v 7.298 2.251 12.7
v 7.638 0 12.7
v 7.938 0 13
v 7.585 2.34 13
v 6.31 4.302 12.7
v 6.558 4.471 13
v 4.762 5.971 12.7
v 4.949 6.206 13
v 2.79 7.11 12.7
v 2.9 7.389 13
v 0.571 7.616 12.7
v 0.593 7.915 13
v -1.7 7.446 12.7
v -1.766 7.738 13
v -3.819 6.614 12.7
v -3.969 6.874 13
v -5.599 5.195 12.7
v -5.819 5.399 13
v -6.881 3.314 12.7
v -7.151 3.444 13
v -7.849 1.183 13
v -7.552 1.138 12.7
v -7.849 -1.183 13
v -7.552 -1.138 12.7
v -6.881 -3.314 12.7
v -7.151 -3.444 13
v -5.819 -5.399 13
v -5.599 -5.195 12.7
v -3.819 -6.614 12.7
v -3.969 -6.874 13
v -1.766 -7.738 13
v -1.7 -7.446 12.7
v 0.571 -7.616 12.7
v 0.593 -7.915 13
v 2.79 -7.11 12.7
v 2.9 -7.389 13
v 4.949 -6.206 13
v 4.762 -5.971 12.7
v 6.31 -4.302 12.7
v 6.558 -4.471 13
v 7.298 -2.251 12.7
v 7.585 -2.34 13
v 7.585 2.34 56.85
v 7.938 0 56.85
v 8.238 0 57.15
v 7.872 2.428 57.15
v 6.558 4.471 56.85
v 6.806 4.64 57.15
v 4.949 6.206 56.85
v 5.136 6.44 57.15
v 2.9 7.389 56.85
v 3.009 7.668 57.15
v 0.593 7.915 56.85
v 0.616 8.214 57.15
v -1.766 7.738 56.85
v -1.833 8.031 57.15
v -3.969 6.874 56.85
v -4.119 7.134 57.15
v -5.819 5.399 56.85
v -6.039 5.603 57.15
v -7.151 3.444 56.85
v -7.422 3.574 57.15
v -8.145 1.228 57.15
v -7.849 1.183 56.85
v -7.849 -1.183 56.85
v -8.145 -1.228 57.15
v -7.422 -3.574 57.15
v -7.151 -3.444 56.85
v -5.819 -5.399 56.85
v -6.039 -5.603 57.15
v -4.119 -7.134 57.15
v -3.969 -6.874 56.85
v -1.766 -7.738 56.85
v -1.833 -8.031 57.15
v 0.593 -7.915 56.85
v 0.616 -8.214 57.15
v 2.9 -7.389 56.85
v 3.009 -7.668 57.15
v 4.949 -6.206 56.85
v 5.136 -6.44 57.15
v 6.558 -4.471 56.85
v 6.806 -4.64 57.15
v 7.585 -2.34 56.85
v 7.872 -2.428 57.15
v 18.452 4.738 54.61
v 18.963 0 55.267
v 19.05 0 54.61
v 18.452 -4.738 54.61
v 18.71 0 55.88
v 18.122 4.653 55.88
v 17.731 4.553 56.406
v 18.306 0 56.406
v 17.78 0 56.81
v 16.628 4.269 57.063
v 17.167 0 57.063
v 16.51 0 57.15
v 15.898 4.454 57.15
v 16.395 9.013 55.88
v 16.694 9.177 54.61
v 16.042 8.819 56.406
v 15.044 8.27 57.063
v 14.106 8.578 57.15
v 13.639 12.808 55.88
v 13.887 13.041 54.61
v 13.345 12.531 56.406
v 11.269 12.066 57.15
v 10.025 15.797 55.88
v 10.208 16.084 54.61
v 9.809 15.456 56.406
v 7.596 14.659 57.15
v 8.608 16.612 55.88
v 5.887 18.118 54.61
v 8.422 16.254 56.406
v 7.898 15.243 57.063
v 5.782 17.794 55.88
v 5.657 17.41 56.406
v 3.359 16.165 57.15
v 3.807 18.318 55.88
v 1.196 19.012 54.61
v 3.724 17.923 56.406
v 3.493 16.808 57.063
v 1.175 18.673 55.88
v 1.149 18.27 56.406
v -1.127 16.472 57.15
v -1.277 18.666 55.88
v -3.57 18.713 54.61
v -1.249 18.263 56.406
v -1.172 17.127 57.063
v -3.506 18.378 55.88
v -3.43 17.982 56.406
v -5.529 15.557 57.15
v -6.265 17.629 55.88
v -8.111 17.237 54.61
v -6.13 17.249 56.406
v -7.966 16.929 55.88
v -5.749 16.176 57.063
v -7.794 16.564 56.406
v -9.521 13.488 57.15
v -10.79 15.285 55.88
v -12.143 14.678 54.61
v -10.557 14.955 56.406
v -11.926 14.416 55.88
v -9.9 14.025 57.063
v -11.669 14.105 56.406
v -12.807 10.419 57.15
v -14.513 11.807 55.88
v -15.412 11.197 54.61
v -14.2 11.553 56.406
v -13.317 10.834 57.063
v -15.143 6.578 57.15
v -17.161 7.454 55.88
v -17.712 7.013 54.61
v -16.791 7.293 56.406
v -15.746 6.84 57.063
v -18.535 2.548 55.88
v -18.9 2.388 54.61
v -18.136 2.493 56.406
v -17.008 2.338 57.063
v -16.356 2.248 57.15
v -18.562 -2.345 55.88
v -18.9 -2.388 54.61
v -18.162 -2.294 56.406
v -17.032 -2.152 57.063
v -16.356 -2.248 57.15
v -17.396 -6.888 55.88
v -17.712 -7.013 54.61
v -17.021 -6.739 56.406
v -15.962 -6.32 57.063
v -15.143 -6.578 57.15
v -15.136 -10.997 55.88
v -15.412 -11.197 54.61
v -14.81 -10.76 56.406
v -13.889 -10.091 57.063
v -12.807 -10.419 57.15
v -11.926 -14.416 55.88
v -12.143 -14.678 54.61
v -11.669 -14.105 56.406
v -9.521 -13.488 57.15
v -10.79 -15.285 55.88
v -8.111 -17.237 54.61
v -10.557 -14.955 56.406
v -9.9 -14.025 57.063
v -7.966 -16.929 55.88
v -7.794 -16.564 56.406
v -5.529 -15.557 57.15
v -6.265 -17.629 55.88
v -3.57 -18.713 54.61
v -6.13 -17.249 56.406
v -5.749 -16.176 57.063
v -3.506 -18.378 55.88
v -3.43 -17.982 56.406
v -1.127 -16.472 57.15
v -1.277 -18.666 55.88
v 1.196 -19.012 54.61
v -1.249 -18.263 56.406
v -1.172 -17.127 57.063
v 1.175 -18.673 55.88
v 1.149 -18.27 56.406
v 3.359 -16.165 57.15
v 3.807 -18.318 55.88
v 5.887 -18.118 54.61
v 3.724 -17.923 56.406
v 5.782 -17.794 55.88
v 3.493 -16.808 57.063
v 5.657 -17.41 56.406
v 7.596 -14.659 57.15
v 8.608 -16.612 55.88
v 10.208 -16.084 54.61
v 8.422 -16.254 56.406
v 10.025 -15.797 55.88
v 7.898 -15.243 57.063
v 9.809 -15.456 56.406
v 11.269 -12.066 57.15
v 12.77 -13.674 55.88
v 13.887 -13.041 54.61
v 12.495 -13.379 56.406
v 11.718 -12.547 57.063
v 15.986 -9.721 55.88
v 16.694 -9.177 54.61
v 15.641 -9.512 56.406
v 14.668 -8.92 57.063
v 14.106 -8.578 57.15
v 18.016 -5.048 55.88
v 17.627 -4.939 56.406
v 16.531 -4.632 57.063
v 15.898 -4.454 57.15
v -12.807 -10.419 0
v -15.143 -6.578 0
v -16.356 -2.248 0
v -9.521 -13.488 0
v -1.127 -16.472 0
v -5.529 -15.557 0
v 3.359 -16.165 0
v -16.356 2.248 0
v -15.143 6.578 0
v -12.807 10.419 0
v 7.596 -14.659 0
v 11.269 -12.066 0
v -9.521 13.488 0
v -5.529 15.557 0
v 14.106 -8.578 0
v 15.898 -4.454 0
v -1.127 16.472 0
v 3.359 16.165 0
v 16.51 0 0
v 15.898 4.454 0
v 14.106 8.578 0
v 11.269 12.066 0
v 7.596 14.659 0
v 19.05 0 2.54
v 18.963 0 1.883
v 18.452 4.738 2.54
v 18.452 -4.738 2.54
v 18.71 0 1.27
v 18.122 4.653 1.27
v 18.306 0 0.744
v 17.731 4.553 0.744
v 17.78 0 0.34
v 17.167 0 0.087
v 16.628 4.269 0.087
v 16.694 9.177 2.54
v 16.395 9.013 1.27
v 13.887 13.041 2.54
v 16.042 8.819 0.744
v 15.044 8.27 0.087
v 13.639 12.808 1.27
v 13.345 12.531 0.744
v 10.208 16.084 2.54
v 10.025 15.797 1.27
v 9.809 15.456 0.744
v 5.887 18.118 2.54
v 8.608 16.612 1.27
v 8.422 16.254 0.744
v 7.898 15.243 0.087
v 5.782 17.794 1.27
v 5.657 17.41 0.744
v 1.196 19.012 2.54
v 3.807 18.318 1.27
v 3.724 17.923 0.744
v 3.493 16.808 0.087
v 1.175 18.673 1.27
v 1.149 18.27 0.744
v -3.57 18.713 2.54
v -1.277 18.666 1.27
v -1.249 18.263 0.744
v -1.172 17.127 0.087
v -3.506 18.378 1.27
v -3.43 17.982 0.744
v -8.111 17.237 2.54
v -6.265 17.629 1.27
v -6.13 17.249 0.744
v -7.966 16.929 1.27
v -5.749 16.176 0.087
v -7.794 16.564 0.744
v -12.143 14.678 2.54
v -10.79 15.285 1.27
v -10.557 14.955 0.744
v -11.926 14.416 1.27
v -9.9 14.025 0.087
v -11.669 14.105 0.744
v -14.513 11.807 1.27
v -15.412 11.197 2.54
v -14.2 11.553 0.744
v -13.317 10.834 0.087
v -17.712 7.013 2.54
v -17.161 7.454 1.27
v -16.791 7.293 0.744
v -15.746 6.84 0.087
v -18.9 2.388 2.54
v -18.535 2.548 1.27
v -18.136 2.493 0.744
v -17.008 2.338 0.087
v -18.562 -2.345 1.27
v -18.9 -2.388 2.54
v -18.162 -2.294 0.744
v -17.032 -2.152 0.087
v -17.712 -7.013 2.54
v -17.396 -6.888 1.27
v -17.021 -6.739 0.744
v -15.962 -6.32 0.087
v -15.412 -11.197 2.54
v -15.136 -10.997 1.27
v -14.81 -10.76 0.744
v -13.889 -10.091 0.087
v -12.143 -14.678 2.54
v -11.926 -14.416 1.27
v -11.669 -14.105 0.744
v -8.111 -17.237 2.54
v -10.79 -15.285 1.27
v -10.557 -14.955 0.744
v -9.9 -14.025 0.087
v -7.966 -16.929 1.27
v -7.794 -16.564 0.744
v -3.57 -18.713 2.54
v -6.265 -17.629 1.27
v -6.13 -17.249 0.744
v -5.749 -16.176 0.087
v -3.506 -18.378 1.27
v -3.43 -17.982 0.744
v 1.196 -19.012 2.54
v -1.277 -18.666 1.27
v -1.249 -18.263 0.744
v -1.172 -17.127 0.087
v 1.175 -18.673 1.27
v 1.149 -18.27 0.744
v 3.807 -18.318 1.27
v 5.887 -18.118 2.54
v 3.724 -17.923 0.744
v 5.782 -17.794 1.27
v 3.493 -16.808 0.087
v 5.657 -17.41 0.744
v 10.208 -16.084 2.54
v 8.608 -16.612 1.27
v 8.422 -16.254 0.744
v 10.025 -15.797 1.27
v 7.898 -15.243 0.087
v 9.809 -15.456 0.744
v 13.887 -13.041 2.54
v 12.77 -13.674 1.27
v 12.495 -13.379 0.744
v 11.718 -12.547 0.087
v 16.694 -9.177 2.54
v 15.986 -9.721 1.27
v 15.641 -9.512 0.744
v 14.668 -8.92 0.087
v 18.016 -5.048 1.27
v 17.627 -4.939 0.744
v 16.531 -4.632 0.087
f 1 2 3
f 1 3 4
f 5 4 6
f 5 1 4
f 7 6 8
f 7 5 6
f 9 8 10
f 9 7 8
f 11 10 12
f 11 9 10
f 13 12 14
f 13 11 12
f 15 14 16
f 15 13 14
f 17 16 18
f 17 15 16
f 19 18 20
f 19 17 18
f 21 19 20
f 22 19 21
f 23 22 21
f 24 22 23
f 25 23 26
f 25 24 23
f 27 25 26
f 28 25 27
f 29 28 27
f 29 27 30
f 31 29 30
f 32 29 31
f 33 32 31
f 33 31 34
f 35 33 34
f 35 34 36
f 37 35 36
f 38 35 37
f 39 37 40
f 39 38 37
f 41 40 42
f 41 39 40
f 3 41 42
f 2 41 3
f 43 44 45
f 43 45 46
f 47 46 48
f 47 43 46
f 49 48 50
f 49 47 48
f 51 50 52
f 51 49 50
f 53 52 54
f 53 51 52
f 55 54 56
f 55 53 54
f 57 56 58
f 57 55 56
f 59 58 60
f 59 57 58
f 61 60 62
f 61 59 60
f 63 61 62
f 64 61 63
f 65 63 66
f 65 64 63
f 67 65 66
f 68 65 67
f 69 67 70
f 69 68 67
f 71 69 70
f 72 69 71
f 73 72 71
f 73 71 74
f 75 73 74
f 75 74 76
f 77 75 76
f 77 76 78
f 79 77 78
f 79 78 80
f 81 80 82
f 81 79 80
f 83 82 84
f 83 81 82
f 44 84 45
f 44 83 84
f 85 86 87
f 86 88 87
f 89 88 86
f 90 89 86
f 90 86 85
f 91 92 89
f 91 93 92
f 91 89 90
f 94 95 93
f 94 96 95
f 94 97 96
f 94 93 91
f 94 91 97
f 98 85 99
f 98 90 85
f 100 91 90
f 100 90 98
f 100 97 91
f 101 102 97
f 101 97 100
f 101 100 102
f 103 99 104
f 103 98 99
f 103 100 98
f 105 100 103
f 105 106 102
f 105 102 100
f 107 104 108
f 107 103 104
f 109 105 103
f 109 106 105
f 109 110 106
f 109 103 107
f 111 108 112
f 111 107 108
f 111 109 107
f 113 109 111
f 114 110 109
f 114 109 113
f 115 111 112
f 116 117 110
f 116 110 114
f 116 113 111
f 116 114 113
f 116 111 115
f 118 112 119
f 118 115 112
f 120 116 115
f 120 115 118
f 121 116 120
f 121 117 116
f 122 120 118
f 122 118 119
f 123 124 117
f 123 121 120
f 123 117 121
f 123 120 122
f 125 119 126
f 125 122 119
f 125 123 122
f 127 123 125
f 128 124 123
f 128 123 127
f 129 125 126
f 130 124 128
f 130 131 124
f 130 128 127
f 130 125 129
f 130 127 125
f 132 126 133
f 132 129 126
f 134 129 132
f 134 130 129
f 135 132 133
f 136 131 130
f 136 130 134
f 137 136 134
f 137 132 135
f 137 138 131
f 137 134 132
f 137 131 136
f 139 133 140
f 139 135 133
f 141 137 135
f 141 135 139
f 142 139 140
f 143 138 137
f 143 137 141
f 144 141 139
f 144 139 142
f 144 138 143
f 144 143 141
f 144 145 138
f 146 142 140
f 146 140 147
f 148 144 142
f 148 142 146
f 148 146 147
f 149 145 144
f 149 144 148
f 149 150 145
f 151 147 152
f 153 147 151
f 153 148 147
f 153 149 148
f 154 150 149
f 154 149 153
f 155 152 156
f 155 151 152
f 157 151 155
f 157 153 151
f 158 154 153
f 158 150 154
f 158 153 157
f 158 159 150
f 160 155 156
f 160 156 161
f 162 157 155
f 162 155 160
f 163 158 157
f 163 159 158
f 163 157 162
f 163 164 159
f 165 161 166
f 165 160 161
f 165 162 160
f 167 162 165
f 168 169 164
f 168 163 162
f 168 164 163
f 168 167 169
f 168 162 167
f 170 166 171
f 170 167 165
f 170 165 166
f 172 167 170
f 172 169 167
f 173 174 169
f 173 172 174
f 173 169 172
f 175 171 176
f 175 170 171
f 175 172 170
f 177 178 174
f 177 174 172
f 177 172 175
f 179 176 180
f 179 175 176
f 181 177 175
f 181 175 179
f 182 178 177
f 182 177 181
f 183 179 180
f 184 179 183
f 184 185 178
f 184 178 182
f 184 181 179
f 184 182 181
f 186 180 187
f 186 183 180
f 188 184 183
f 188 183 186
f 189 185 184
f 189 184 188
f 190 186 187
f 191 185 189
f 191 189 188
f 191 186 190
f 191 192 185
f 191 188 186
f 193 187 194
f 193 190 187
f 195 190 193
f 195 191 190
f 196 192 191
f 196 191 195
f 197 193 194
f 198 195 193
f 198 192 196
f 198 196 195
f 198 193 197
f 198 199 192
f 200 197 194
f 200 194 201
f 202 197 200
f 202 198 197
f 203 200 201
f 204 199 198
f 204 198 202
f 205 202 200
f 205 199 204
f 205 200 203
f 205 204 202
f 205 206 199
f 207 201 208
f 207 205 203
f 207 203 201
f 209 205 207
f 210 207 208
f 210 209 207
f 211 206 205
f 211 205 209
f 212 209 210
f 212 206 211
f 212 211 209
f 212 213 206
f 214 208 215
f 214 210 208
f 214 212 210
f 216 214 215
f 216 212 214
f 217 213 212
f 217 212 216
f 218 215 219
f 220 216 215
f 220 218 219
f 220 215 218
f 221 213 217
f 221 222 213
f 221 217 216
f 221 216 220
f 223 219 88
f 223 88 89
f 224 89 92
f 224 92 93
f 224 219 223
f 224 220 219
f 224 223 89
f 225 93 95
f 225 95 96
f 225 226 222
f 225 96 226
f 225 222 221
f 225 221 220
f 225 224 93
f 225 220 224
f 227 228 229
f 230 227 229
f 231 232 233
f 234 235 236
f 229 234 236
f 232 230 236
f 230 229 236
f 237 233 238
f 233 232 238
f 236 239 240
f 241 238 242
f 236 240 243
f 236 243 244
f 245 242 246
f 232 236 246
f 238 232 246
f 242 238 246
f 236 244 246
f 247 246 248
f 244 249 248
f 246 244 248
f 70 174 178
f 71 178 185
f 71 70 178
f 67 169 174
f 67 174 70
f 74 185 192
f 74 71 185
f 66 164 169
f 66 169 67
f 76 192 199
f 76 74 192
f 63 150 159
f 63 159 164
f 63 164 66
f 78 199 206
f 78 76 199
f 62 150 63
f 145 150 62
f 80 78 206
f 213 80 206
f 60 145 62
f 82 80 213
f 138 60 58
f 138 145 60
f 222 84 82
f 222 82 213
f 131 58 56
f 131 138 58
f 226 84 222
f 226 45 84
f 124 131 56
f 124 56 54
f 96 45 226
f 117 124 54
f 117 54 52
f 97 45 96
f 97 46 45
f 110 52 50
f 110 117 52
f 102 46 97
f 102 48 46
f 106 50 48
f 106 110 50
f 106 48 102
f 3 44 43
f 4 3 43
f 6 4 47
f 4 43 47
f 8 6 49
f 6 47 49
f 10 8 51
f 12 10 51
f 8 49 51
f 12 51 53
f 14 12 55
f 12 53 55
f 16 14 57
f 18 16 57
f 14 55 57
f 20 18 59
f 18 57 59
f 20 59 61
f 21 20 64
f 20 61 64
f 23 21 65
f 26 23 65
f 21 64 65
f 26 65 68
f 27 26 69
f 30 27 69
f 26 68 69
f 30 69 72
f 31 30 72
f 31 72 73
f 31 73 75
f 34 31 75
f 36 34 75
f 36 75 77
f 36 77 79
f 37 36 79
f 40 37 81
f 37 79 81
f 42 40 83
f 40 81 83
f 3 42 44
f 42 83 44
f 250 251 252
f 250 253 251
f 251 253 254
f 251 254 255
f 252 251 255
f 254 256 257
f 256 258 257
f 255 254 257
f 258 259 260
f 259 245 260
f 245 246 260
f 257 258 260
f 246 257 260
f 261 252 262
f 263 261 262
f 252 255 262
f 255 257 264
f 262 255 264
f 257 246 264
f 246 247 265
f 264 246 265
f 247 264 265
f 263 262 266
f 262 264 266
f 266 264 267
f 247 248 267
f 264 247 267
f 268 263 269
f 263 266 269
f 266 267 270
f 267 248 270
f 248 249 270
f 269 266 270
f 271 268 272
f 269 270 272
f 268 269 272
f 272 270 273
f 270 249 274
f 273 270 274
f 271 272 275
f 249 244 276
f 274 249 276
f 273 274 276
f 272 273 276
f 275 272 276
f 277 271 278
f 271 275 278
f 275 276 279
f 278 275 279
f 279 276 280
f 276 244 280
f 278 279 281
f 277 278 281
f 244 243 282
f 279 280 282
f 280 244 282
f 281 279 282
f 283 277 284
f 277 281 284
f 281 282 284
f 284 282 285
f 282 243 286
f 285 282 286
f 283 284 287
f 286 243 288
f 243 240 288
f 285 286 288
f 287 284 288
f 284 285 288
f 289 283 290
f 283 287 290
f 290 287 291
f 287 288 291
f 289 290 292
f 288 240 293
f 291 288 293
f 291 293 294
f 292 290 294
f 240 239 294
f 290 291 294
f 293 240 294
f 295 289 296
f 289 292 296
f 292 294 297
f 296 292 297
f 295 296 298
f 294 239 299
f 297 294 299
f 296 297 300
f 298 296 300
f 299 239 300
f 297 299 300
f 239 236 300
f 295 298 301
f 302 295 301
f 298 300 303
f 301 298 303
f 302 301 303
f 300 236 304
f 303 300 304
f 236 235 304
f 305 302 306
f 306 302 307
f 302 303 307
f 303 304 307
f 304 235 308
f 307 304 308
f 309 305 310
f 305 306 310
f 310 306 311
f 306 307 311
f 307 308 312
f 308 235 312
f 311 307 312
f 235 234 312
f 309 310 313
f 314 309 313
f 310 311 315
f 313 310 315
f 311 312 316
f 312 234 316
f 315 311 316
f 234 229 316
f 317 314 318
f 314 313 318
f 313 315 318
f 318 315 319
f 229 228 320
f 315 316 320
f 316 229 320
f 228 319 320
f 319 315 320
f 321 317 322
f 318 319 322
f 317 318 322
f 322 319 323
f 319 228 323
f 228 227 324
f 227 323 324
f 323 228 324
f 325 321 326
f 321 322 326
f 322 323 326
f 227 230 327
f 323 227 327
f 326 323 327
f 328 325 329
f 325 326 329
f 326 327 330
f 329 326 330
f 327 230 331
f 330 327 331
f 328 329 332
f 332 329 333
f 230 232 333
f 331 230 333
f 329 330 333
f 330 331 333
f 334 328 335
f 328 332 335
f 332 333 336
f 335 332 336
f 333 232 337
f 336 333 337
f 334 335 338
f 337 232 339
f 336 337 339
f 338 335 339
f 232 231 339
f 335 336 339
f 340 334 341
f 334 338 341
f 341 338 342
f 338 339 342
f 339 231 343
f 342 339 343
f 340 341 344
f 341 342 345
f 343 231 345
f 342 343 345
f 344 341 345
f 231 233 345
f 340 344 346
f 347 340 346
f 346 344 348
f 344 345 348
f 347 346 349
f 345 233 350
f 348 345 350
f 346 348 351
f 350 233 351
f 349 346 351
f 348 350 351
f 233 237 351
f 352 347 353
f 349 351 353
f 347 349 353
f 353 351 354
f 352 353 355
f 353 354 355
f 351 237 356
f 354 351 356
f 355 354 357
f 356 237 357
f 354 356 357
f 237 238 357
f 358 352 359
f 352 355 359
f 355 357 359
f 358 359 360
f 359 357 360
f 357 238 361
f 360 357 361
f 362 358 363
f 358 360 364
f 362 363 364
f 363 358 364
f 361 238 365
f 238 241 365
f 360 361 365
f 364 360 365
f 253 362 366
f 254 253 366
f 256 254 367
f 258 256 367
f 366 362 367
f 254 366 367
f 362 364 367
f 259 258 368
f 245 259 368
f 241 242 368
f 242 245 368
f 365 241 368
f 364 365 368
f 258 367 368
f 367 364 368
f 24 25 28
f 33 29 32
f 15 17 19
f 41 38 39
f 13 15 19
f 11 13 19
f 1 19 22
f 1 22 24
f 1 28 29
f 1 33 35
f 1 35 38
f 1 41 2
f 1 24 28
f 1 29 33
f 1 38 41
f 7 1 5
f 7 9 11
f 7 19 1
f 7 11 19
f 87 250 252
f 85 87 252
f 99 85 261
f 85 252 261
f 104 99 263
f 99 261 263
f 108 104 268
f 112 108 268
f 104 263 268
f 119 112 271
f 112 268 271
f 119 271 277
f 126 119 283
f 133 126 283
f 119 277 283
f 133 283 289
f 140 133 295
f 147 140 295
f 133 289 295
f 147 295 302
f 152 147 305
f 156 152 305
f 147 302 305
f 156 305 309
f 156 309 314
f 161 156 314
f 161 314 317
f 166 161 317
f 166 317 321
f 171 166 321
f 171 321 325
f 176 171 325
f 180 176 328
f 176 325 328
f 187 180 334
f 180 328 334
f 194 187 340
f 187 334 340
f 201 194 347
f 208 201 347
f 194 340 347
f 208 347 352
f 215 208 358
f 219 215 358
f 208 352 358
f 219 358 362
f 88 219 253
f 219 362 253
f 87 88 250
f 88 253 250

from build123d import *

# Parameters (mm, degrees)
F0_R     = 19.05
F1_DEPTH = 57.15
F2_R     = 7.9375
F3_DEPTH = 44.45
F4_R     = 2.54
F5_SIZE  = 0.3


with BuildPart() as f1:
    # F0 (on Top) → F1 (new body)
    with BuildSketch(Plane.XY):
        Circle(F0_R)
    extrude(amount=F1_DEPTH)

    # F2 (on face) → F3 (cut)
    with BuildSketch(Plane.XY.offset(57.15)):
        Circle(F2_R)
    extrude(amount=-F3_DEPTH, mode=Mode.SUBTRACT)

    # F4
    f4_edges = [f1.edges().sort_by_distance(p)[0] for p in [
        (-19.05, 0, 0),
        (-19.05, 0, 57.15),
    ]]
    fillet(f4_edges, radius=F4_R)

    # F5
    f5_edges = [f1.edges().sort_by_distance(p)[0] for p in [
        (-7.9375, 0, 57.15),
        (-7.9375, 0, 12.7),
    ]]
    chamfer(f5_edges, length=F5_SIZE)


solid = f1.part
